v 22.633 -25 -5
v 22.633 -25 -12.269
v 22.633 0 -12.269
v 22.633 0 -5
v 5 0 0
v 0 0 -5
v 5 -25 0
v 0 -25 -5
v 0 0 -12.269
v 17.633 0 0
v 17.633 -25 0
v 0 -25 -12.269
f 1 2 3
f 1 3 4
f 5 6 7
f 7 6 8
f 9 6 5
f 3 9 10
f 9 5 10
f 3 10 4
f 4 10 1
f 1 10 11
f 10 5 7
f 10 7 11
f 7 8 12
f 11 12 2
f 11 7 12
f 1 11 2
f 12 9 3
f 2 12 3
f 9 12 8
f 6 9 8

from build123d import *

# Parameters (mm, degrees)
F0_W     = 22.633268
F0_H     = 12.269363
F1_DEPTH = 25
F2_R     = 22.308841
F3_DEPTH = 29.9
F5_SIZE  = 5
F6_SIZE  = 5


with BuildPart() as f1:
    # F0 (on Front) → F1 (new body)
    with BuildSketch(Plane.XZ):
        with Locations((11.316634, -6.134682)):
            Rectangle(F0_W, F0_H)
    extrude(amount=F1_DEPTH)

    # F5
    f5_edges = [f1.edges().sort_by_distance(p)[0] for p in [
        (22.633268, -12.5, 0),
    ]]
    chamfer(f5_edges, length=F5_SIZE)

    # F6
    f6_edges = [f1.edges().sort_by_distance(p)[0] for p in [
        (0, -12.5, 0),
    ]]
    chamfer(f6_edges, length=F6_SIZE)


with BuildPart() as f3:
    # F2 (on Top) → F3 (new body)
    with BuildSketch(Plane.XY):
        with Locations((-79.230487, 19.022213)):
            Circle(F2_R)
    extrude(amount=F3_DEPTH)


solid = f1.part
